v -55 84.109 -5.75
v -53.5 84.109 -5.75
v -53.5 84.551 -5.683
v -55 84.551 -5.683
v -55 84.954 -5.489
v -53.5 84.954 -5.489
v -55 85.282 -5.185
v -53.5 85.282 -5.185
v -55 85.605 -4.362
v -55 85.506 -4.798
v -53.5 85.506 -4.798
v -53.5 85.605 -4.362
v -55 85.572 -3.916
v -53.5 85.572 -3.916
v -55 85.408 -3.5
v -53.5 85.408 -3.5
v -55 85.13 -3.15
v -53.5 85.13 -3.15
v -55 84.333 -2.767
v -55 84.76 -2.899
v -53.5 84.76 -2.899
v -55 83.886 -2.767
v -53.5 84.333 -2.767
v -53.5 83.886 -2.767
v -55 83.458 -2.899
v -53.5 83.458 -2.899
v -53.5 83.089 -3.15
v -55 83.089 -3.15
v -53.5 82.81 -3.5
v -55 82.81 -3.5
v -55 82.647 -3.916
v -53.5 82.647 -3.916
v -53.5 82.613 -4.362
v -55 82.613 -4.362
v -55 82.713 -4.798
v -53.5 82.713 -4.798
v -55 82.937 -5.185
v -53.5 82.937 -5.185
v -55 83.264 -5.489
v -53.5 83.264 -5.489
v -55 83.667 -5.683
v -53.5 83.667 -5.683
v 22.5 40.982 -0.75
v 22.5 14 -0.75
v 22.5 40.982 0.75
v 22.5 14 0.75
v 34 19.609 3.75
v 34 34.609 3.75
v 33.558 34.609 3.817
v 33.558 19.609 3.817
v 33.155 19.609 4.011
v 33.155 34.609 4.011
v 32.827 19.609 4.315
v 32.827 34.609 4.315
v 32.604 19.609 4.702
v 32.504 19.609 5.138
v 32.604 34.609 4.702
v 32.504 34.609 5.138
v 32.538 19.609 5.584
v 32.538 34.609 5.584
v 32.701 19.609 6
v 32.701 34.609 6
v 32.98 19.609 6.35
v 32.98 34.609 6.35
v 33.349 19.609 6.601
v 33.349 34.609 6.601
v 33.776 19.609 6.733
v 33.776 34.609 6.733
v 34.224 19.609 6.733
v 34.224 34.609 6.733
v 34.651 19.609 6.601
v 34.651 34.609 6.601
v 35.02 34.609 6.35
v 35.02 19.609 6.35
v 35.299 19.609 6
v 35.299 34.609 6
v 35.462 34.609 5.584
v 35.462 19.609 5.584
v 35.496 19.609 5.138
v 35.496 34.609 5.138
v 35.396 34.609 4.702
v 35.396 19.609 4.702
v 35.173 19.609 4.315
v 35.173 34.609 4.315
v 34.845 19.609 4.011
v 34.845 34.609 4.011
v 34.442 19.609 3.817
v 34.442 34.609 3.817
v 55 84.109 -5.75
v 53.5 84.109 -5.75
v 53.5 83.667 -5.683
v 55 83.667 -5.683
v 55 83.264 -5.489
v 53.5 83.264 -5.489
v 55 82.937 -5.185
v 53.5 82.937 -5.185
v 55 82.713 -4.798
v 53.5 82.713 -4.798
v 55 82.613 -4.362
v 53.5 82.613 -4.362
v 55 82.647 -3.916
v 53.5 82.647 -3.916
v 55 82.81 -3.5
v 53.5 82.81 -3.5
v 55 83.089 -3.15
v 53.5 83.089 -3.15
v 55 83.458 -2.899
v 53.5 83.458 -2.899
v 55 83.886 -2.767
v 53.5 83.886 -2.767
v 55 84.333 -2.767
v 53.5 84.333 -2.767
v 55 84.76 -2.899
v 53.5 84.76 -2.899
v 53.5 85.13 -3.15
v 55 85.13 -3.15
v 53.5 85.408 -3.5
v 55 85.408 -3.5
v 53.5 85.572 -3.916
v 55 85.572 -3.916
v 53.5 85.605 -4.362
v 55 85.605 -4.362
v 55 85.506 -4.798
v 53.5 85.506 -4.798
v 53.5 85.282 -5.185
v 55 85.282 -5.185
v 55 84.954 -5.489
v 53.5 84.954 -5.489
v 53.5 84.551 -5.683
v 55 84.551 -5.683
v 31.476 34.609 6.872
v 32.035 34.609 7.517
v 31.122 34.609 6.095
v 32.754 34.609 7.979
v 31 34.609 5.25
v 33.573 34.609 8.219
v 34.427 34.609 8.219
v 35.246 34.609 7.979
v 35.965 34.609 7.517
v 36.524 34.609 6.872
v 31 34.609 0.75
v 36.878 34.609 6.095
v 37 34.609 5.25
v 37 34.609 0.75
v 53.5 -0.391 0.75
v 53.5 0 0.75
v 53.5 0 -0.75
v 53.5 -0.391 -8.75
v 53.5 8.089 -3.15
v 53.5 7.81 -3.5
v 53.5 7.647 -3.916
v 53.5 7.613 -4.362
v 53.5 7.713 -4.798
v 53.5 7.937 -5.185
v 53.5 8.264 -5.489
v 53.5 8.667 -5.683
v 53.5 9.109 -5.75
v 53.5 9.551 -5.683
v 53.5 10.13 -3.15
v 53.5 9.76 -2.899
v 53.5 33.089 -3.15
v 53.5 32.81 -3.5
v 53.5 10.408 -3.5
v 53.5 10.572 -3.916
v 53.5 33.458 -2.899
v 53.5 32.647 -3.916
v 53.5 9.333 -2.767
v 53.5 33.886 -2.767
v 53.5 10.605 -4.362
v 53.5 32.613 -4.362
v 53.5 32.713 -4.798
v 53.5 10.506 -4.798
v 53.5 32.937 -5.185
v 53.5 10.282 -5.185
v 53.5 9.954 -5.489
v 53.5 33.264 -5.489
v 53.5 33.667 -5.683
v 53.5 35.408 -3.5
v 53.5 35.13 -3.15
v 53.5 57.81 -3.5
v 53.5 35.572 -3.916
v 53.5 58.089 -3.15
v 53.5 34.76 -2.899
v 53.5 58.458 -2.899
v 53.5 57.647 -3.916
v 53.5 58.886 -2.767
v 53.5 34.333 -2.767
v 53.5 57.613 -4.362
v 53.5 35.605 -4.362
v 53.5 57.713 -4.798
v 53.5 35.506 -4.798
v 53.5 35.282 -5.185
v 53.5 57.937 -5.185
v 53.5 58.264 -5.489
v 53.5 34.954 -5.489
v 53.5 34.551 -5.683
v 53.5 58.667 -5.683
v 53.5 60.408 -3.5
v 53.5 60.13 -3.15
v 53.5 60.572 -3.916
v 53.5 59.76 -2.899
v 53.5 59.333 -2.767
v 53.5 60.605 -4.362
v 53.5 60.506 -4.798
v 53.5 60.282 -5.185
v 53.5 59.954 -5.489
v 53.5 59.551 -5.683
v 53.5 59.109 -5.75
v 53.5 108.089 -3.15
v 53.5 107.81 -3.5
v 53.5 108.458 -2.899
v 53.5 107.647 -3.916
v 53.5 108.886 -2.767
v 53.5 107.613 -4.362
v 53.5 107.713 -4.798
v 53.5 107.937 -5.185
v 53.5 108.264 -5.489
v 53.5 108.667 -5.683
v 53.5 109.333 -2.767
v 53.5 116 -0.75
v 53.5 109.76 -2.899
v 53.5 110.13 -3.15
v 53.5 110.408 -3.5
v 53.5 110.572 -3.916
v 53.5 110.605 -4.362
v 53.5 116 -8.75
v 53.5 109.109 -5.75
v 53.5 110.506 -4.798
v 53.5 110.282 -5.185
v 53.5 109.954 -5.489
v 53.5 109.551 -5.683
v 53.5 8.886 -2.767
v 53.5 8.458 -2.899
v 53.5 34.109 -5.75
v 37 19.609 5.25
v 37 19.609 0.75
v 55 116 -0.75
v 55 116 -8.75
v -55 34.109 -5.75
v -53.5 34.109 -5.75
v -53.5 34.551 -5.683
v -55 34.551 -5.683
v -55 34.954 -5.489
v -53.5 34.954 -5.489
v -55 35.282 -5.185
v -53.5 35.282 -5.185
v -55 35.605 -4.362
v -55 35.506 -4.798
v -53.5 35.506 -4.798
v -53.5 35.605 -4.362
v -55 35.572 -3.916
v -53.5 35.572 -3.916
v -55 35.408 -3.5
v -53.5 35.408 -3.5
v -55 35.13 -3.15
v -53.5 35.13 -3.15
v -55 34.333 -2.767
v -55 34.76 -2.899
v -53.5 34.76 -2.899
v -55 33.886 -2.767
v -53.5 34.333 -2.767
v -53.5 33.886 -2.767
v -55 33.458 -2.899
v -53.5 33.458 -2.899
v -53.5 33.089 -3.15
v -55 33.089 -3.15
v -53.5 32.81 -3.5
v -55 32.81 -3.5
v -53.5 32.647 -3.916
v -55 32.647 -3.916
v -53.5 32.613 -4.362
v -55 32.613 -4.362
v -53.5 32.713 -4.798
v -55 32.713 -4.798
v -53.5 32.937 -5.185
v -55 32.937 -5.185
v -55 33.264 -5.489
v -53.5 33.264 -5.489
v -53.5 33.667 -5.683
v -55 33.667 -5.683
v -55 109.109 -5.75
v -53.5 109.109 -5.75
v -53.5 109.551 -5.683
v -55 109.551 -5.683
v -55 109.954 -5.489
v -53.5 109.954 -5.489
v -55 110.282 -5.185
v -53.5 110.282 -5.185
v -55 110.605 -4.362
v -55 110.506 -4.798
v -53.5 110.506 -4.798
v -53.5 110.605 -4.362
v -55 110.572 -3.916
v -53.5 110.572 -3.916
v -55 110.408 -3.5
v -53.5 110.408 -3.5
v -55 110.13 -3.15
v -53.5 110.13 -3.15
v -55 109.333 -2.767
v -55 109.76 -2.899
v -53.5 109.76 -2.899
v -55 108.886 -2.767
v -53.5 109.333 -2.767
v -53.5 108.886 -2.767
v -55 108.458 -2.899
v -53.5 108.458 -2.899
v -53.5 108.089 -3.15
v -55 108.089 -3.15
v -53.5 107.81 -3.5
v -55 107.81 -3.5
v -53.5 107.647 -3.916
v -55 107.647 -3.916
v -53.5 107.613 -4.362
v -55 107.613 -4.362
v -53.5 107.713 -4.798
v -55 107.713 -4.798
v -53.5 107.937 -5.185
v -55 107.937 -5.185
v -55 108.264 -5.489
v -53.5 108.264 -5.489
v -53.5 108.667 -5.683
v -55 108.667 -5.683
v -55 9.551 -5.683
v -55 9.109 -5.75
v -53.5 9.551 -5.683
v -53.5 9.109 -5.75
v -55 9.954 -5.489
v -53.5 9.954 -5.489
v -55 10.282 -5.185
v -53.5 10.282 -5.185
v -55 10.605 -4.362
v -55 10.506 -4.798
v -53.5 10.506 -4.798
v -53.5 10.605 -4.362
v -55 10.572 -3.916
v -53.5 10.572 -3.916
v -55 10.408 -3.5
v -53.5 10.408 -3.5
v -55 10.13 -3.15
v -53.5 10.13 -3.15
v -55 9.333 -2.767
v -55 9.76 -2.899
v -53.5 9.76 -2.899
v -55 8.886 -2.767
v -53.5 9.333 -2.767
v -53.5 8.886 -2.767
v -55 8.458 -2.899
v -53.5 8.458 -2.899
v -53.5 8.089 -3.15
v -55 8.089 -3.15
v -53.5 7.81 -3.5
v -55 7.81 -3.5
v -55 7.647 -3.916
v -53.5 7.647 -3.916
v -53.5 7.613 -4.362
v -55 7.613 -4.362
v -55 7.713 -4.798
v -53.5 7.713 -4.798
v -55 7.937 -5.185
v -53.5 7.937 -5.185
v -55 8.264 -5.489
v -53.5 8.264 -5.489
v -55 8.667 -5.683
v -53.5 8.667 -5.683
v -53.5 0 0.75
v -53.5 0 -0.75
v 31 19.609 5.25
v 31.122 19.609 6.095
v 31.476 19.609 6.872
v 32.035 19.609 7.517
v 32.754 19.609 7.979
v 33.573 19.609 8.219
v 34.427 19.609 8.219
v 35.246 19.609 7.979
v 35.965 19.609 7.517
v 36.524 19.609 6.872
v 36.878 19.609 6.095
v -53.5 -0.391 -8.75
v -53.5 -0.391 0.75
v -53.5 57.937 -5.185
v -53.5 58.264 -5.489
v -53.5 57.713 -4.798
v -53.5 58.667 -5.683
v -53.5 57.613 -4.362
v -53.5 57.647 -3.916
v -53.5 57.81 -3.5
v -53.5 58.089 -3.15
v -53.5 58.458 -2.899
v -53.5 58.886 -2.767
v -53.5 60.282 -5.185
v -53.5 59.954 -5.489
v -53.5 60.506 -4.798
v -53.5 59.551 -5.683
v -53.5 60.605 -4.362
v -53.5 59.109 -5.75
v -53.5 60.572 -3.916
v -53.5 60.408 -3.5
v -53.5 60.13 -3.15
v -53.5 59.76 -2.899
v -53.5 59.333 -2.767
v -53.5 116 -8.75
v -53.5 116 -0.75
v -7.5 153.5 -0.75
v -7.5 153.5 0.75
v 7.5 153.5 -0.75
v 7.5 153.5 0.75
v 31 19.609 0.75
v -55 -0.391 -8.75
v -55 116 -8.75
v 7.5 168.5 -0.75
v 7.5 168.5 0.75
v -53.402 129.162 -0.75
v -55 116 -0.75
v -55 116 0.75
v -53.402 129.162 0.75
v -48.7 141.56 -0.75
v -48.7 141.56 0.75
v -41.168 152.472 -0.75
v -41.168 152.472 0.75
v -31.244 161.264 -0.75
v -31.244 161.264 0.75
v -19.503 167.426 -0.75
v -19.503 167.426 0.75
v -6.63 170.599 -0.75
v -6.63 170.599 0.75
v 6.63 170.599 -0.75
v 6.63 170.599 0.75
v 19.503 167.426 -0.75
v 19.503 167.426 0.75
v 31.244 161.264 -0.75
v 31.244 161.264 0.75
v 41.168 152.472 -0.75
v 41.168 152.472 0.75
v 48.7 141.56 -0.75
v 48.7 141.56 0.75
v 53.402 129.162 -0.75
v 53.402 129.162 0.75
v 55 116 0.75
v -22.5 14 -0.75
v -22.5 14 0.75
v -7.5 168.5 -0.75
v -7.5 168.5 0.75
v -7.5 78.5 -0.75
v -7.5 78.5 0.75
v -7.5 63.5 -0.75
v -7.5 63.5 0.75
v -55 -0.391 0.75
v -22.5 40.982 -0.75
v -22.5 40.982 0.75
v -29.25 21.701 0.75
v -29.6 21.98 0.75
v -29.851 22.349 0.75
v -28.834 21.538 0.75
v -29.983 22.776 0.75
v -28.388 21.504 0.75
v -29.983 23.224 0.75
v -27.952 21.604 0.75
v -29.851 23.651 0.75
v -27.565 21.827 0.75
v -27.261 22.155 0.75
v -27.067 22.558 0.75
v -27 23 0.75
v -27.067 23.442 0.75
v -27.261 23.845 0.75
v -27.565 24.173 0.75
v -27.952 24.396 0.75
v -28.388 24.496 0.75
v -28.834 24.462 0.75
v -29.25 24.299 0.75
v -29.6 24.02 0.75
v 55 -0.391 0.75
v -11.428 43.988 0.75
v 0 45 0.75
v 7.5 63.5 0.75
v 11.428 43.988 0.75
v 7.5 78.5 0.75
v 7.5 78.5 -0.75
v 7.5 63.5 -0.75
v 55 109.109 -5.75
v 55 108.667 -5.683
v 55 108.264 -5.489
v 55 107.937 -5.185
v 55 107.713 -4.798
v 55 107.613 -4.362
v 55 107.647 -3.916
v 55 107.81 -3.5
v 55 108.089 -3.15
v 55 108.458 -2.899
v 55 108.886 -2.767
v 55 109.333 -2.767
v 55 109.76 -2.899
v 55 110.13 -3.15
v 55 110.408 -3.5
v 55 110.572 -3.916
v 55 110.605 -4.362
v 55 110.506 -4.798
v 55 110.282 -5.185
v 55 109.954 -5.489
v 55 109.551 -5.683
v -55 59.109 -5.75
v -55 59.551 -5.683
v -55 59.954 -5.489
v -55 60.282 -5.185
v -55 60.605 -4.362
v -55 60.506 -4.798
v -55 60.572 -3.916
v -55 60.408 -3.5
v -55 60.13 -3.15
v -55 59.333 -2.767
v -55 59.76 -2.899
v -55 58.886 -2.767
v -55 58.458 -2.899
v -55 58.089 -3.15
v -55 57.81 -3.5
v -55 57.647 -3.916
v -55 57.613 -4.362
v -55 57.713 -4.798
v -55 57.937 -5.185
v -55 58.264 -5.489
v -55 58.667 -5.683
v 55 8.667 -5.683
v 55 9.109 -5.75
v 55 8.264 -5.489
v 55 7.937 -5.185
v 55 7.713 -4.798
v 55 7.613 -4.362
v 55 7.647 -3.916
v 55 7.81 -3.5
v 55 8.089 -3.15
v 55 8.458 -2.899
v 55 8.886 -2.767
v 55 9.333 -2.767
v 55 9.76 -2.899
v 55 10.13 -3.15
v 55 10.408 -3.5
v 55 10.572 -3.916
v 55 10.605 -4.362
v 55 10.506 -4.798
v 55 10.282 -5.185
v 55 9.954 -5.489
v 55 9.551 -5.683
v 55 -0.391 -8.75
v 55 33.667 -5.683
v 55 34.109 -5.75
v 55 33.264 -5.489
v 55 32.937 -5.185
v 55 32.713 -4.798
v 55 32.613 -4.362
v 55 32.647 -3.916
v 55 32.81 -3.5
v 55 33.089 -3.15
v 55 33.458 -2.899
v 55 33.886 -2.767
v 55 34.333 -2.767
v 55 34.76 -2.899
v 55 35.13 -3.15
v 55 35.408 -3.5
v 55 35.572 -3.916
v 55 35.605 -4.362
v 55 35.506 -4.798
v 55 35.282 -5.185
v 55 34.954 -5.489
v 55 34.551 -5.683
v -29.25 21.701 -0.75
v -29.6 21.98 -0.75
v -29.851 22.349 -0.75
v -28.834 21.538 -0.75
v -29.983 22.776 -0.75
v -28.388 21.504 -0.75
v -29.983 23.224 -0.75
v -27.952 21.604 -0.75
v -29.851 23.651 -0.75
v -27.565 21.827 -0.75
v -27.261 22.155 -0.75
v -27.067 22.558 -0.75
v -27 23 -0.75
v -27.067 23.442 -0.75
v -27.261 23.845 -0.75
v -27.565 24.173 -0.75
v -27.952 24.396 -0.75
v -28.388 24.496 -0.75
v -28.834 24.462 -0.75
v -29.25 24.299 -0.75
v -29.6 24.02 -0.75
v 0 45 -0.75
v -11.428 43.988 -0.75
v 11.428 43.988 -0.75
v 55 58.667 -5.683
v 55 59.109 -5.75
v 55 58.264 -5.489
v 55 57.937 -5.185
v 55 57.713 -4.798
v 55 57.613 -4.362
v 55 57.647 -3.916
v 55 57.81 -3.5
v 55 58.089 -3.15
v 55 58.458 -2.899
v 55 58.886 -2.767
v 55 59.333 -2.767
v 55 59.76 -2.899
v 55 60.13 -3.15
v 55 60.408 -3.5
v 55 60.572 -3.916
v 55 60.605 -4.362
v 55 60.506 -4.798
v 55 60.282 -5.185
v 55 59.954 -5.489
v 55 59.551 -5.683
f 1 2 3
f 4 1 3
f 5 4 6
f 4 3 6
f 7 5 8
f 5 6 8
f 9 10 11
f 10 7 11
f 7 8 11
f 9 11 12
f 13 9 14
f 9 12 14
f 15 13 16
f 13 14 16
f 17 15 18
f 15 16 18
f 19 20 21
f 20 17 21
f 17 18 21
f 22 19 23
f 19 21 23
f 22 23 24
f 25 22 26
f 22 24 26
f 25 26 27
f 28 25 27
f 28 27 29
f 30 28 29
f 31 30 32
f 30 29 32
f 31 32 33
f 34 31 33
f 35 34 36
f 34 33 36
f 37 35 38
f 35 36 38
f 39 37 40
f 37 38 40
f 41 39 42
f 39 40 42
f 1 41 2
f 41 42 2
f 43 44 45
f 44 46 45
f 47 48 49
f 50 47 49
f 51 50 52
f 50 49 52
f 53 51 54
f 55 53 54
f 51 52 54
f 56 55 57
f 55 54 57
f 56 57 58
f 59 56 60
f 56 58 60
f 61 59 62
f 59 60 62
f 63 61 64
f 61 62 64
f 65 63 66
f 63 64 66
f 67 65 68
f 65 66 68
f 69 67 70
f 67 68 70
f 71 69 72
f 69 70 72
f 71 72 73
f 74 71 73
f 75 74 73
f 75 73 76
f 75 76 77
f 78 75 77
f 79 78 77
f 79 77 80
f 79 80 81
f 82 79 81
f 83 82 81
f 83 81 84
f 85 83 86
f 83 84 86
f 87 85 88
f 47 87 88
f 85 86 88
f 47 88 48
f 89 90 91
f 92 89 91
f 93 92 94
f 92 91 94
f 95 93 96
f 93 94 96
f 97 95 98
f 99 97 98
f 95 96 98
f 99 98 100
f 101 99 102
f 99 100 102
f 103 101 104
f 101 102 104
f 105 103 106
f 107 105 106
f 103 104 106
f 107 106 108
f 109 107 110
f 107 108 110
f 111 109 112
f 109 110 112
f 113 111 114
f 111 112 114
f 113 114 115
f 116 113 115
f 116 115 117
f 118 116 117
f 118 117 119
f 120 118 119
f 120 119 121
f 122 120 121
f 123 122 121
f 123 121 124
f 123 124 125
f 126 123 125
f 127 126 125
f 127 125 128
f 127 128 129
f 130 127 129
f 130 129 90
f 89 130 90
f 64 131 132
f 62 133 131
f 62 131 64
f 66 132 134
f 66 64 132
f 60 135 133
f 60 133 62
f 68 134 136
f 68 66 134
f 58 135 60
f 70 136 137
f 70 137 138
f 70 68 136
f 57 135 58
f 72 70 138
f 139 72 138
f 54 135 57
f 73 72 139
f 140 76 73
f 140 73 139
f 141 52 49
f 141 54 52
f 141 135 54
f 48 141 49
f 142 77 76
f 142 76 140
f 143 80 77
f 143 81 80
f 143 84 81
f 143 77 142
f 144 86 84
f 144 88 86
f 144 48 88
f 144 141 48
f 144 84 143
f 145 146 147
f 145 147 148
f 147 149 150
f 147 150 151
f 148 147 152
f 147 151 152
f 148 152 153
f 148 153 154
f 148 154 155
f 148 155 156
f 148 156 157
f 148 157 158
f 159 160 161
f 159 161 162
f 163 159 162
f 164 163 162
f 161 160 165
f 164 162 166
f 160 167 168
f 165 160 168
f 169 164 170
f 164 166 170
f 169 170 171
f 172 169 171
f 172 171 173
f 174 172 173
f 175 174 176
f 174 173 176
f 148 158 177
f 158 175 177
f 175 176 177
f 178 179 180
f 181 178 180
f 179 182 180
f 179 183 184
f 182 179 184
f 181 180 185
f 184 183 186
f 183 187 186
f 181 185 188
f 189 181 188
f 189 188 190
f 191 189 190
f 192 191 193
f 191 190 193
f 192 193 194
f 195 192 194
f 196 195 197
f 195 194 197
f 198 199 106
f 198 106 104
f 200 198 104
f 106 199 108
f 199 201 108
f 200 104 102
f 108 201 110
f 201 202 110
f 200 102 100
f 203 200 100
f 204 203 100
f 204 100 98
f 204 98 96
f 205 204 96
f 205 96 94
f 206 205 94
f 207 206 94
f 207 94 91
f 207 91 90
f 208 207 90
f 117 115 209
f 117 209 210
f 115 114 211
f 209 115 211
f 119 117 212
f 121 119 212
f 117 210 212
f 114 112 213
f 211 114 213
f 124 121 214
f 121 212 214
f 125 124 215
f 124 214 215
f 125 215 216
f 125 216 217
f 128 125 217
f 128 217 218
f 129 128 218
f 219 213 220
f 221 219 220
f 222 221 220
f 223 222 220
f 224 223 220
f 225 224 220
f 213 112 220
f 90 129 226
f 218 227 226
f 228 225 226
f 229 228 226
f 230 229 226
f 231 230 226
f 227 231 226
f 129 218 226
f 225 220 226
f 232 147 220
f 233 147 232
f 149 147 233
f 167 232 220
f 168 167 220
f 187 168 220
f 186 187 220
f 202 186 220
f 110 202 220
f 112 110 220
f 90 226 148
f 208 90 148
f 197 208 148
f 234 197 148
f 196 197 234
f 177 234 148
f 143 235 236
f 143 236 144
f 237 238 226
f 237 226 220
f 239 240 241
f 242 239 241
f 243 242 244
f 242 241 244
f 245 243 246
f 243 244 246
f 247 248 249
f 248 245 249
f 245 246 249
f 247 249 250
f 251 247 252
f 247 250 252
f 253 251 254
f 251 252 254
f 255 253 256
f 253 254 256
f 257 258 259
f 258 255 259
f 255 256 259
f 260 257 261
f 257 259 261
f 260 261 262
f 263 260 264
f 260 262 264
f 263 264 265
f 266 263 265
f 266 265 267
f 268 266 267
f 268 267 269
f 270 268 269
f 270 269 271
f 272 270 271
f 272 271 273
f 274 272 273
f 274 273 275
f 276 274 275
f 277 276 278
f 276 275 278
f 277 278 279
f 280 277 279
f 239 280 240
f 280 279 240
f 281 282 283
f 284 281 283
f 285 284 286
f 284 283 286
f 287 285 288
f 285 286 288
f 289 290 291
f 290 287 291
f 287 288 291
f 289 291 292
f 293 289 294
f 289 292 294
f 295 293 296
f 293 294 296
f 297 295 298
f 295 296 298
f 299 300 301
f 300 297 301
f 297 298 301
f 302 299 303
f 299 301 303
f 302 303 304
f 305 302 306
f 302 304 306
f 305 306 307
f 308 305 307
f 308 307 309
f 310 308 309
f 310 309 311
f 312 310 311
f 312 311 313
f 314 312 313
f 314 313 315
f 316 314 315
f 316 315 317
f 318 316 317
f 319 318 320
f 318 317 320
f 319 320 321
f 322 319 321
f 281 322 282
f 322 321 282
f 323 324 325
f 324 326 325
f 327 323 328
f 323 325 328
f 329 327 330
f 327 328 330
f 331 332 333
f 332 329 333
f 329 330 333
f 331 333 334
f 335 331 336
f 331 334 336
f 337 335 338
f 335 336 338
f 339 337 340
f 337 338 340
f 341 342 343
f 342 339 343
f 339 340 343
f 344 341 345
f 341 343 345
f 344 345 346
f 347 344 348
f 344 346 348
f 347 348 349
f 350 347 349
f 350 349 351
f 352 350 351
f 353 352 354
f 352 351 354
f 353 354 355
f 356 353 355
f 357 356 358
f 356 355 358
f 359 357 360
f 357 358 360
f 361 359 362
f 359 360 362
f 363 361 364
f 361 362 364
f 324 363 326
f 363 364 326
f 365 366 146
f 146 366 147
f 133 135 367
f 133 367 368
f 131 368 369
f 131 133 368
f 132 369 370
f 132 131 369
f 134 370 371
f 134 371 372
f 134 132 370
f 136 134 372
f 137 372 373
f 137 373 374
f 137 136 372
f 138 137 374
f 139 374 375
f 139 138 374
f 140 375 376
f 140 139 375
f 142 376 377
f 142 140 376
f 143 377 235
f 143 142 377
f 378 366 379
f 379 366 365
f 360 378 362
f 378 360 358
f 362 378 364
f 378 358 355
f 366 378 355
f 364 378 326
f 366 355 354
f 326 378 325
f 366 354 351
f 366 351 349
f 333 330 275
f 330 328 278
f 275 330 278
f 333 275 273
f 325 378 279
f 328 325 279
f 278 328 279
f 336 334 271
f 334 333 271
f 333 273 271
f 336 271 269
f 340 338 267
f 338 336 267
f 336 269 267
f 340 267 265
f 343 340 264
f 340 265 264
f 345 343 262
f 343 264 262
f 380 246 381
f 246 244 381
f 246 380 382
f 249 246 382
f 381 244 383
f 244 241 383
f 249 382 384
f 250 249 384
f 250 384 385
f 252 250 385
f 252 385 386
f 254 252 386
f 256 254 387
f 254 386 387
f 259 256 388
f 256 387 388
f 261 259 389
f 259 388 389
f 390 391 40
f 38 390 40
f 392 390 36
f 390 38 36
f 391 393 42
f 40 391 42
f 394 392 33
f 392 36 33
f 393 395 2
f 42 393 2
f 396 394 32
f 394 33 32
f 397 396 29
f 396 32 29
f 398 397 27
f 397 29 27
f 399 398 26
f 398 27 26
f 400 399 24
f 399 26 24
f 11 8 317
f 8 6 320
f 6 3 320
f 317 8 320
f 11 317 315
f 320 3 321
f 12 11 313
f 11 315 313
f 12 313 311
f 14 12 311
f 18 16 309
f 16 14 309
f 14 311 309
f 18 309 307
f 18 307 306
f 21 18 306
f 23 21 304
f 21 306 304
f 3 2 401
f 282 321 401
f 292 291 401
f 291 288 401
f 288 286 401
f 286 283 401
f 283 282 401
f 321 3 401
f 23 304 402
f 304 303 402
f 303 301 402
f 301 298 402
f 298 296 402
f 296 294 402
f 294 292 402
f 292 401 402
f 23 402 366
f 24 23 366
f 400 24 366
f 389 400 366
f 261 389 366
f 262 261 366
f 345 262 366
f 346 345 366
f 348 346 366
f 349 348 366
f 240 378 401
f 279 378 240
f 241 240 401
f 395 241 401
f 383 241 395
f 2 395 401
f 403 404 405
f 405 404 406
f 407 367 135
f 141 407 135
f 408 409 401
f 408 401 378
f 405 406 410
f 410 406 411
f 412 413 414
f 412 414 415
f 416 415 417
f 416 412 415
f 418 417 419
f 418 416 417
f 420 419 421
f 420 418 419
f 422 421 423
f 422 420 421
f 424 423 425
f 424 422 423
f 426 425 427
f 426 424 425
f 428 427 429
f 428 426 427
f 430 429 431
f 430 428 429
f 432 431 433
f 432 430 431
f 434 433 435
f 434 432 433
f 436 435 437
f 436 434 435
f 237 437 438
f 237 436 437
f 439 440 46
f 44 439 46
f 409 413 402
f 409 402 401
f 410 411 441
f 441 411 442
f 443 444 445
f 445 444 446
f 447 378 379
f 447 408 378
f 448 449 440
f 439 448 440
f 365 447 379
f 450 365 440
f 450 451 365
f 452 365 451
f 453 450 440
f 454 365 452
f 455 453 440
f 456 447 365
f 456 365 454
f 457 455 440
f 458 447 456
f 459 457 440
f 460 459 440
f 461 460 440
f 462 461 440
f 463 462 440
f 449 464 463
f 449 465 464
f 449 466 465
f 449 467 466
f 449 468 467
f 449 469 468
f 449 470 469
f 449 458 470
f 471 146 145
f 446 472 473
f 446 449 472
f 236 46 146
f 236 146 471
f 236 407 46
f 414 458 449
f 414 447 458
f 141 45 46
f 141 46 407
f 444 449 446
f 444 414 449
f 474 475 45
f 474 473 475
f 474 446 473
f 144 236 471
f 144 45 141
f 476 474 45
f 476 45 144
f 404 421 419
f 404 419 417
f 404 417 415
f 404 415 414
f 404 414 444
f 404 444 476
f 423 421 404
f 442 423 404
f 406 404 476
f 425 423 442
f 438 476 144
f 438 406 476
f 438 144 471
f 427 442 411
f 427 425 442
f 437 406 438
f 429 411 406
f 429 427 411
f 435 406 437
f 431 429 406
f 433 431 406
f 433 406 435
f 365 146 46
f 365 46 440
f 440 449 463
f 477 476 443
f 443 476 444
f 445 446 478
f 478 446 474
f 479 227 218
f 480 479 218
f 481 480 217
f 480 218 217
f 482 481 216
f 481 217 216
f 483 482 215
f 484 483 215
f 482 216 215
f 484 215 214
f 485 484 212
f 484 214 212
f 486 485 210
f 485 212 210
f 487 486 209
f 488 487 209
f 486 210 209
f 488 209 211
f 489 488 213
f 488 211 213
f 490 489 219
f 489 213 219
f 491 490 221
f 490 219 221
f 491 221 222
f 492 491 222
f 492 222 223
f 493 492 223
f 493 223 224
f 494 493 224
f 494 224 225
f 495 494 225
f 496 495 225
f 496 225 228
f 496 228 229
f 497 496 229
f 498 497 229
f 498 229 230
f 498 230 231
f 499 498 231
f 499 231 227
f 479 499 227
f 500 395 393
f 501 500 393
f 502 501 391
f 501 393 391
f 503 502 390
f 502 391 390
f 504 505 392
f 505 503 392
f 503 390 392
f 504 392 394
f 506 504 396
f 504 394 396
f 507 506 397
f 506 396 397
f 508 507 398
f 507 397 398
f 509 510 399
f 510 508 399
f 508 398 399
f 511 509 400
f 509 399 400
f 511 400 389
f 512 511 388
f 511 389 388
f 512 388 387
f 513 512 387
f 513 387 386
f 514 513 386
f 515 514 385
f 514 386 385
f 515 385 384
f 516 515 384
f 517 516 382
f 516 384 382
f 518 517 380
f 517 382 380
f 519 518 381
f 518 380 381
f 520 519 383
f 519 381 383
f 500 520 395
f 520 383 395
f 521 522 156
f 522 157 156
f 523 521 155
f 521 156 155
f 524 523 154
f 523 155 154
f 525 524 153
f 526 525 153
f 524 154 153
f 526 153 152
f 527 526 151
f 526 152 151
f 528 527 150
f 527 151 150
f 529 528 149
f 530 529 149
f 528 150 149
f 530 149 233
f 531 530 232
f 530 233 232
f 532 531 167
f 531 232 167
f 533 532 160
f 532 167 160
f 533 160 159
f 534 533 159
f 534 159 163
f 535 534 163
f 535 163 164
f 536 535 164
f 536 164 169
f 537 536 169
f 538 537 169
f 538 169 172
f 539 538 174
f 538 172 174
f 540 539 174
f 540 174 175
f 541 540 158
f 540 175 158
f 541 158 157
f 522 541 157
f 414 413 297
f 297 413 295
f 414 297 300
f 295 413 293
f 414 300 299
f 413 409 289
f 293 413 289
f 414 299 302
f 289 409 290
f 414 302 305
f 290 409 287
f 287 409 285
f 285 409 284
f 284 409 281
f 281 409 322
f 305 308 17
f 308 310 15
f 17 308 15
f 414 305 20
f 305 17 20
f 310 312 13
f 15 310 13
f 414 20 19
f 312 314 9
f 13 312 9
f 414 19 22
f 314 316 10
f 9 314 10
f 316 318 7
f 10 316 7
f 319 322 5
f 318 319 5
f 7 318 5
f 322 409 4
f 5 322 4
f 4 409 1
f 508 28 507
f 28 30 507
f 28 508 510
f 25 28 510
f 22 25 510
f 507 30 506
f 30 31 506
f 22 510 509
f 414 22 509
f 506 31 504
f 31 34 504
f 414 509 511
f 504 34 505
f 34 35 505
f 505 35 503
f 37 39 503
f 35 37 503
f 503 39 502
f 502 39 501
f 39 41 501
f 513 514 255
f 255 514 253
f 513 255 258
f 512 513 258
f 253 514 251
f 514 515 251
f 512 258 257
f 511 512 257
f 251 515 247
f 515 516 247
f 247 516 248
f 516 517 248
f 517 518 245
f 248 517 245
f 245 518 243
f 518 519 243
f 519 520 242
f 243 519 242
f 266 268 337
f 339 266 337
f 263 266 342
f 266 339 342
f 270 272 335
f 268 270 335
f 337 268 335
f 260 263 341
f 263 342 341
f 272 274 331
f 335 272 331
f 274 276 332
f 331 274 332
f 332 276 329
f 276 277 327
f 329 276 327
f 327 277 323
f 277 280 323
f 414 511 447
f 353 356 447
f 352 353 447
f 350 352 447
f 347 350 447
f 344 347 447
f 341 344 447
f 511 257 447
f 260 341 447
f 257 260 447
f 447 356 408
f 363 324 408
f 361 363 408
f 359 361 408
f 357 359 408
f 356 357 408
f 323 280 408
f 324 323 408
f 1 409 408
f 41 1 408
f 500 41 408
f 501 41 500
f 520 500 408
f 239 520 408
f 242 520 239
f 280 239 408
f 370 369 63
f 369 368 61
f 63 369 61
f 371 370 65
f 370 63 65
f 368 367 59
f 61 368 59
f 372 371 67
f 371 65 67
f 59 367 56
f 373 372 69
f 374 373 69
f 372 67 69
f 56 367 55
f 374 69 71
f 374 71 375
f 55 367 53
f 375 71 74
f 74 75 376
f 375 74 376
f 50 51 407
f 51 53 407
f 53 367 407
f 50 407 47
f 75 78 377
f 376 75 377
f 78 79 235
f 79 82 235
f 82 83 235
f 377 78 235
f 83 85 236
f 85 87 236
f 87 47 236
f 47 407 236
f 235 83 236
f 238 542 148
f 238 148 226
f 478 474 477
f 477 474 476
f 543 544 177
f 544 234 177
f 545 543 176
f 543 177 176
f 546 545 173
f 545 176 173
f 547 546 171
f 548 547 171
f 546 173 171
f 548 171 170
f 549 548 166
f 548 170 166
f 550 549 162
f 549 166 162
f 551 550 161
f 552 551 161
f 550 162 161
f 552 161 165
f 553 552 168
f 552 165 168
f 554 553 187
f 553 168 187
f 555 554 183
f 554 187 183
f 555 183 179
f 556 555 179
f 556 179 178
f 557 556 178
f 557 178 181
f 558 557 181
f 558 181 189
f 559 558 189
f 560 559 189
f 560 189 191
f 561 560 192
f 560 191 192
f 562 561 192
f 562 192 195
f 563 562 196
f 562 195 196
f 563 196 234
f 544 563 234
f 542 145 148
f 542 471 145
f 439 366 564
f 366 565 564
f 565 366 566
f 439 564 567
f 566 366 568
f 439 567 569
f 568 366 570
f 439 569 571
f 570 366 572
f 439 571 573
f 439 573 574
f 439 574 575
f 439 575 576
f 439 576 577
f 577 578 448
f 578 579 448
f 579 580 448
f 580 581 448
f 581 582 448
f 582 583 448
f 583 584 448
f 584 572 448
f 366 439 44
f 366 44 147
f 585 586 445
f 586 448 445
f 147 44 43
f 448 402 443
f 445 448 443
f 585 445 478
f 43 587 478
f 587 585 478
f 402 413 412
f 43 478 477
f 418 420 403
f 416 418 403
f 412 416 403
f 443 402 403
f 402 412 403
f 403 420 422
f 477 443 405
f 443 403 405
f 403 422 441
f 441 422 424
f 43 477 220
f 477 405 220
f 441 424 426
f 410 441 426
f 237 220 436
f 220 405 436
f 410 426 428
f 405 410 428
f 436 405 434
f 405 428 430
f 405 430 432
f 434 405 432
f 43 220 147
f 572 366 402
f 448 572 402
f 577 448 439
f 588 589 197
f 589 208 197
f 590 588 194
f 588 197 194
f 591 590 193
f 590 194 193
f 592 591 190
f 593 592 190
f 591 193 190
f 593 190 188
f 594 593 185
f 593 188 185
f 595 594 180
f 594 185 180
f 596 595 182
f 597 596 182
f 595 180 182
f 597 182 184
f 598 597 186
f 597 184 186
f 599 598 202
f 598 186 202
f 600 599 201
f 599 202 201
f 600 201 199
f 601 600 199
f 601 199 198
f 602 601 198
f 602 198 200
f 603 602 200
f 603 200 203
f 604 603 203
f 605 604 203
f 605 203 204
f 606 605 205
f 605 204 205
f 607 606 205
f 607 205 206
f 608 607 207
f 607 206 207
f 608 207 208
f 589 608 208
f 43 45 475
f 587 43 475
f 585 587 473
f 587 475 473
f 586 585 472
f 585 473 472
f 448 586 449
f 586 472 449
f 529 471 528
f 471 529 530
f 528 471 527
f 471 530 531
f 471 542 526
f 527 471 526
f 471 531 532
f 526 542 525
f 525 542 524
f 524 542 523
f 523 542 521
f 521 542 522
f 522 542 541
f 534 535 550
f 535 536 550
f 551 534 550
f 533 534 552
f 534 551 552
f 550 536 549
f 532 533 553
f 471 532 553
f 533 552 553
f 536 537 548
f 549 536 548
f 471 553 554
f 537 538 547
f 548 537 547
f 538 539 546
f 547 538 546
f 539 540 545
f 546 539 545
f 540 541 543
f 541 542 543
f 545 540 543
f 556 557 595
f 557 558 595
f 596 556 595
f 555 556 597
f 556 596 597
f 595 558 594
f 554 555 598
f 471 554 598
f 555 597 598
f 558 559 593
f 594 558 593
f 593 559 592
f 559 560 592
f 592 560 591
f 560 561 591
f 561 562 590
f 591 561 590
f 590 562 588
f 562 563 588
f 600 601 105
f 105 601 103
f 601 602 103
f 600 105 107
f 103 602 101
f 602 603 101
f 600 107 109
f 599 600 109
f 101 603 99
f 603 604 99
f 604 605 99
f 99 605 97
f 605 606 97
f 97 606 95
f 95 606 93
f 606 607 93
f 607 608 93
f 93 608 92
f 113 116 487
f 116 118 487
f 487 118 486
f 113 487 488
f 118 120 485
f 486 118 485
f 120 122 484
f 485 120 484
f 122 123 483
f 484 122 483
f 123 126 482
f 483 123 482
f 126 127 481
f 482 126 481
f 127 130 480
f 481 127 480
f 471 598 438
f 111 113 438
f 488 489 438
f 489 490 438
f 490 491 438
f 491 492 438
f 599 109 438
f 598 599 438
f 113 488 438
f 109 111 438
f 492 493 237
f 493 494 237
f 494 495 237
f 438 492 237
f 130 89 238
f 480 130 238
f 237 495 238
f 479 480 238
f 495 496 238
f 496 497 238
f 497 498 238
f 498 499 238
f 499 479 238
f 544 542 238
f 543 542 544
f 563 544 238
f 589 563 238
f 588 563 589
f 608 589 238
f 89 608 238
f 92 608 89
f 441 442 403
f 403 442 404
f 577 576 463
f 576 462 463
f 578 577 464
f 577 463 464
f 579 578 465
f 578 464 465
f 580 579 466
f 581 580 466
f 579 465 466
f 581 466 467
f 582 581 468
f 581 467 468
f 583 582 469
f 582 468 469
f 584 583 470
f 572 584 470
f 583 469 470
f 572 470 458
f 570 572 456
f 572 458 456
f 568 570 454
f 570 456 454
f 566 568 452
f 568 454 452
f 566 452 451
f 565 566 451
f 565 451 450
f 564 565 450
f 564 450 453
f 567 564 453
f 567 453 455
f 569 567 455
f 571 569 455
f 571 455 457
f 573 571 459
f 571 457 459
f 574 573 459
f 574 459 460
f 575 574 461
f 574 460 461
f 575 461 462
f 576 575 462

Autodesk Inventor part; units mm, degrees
ref_plane "XZ Plane" through (0, 0, 0) normal (0, 1, 0) x (-1, 0, 0)
ref_plane "XY Plane" through (0, 0, 0) normal (0, 0, 1) x (1, 0, 0)
sketch "Sketch2" plane through (0, 0, 0) normal (0, 0, 1) x (1, 0, 0)
  line L0 (-55, 0) -> (55, 0)
  line L1 (55, 0) -> (55, 116)
  arc A0 (55, 116) -> (-55, 116) centre (0, 116) ccw
  line L2 (-55, 116) -> (-55, 0)
  point P0 (0, 0)
  point P1 (0, 0)
  dimension "d0" = 55
  dimension "d1" = 116
extrude "Extrusion1" add sketch "Sketch2" along normal mid plane 1.5
sketch "Sketch3" plane through (0, 0, 0.75) normal (0, 0, 1) x (1, 0, 0)
  line L0 (-22.5, 14) -> (22.5, 14)
  line L1 (22.5, 14) -> (22.5, 40.9816)
  line L2 (-22.5, 40.9816) -> (-22.5, 14)
  arc A0 (22.5, 40.9816) -> (-22.5, 40.9816) centre (0, -20) ccw
  arc A1 (55, 116) -> (-55, 116) centre (0, 116) ccw projected
  line L3 (-55, 0) -> (55, 0) projected
  point P0 (0, 0)
  point P1 (0, 14)
  point P2 (0, 171)
  point P3 (0, 45)
  dimension "d4" = 65
  dimension "d5" = 45
  dimension "d6" = 14
  dimension "d7" = 31
extrude "Extrusion2" cut sketch "Sketch3" against normal up to surface (1.5 mm away)
sketch "Sketch4" plane through (0, 0, 0.75) normal (0, 0, 1) x (1, 0, 0)
  line L0 (-7.5, 63.5) -> (7.5, 63.5)
  line L1 (7.5, 63.5) -> (7.5, 78.5)
  line L2 (7.5, 78.5) -> (-7.5, 78.5)
  line L3 (-7.5, 78.5) -> (-7.5, 63.5)
  line L4 (-7.5, 153.5) -> (7.5, 153.5)
  line L5 (7.5, 153.5) -> (7.5, 168.5)
  line L6 (7.5, 168.5) -> (-7.5, 168.5)
  line L7 (-7.5, 168.5) -> (-7.5, 153.5)
  arc A0 (22.5, 40.9816) -> (-22.5, 40.9816) centre (0, -20) ccw projected
  arc A1 (55, 116) -> (-55, 116) centre (0, 116) ccw projected
  point P0 (0, 0)
  point P1 (0, 153.5)
  point P2 (0, 45)
  point P3 (0, 63.5)
  point P4 (0, 45)
  point P5 (7.5, 71)
  dimension "d10" = 15
  dimension "d11" = 15
  dimension "d12" = 15
  dimension "d13" = 15
  dimension "d14" = 37.5
  dimension "d15" = 37.5
extrude "Extrusion3" cut sketch "Sketch4" against normal up to surface (1.5 mm away)
sketch "Sketch6" plane through (55, 0, 0.75) normal (1, 0, 0) x (0, 0, -1)
  line L0 (0, 0) -> (0, 116) projected
  line L1 (1.5, 116) -> (0, 116) projected
  line L2 (1.5, 116) -> (1.5, 0) projected
  line L3 (0, 0) -> (1.5, 0) projected
  line L4 (0, -0.3907) -> (9.5, -0.3907)
  line L5 (9.5, -0.3907) -> (9.5, 116)
  line L6 (9.5, 116) -> (0, 116)
  line L7 (0, 116) -> (0, -0.3907)
  point P0 (0.75, 0)
  dimension "d18" = 9.5
extrude "Extrusion4" add sketch "Sketch6" against normal blind 1.5
sketch "Sketch7" plane through (55, -0.3907, 0.75) normal (1, 0, 0) x (0, 0, -1)
  line L0 (0, 0) -> (9.5, 0) projected
  line L1 (0, 116.3907) -> (0, 0) projected
  point P0 (0.75, 0.3907)
  point P1 (5, 109.5)
  point P2 (5, 84.5)
  point P3 (5, 59.5)
  point P4 (5, 34.5)
  point P5 (5, 9.5)
  dimension "d21" = 9.5
  dimension "d22" = 25
  dimension "d23" = 25
  dimension "d24" = 25
  dimension "d25" = 25
  dimension "d26" = 5
hole "Hole1" at (55, 109.1093, -4.25) at (55, 84.1093, -4.25) at (55, 59.1093, -4.25) at (55, 34.1093, -4.25) at (55, 9.1093, -4.25) direction (-1, 0, 0) diameter 3 depth 1.5
mirror "Mirror1" about plane through (0, 0, 0) normal (1, 0, 0) of "Extrusion4", "Hole1"
ref_plane "Work Plane1" through (31, 0, 0) normal (1, 0, 0) x (0, 1, 0)
sketch "Sketch8" plane through (31, 0, 0) normal (1, 0, 0) x (0, 1, 0)
  point P0 (0, 0)
sketch "Sketch9" plane through (31, 0, 0) normal (1, 0, 0) x (0, 1, 0)
  line L0 (40.9816, 0.75) -> (14, 0.75) projected
  line L1 (14, 0.75) -> (40.9816, 0.75) projected
  line L2 (34.6093, 0.75) -> (34.6093, 5.25)
  line L3 (34.6093, 5.25) -> (19.6093, 5.25)
  line L4 (19.6093, 5.25) -> (19.6093, 0.75)
  line L5 (-0.3907, -8.75) -> (-0.3907, 0.75) projected
  point P0 (0, 0)
  dimension "d35" = 20
  dimension "d36" = 15
  dimension "d37" = 4.5
extrude "Extrusion5" add sketch "Sketch9" along normal blind 6
sketch "Sketch10" plane through (31, 34.6093, 5.25) normal (0, 1, 0) x (1, 0, 0)
  line L0 (0, 4.5) -> (0, 0) projected
  line L1 (0, 0) -> (6, 0) projected
  line L2 (6, 4.5) -> (6, 0) projected
  line L3 (0, 4.5) -> (6, 4.5) projected
  arc A0 (0, 0) -> (6, 0) centre (3, 0) ccw
  point P0 (-31, 5.25)
extrude "Extrusion6" add sketch "Sketch10" against normal up to surface (15 mm away) contours L1 A0
sketch "Sketch11" plane through (31, 19.6093, 0.75) normal (0, -1, 0) x (1, 0, 0)
  arc A0 (6, 4.5) -> (0, 4.5) centre (3, 4.5) ccw projected
  point P0 (-31, -0.75)
  point P1 (3, 7.5)
hole "Hole2" at (34, 19.6093, 5.25) direction (0, 1, 0) diameter 3 depth 15
sketch "Sketch12" plane through (0, 0, 0.75) normal (0, 0, 1) x (1, 0, 0)
  circle A0 centre (-28.5, 23) radius 1.5
  line L0 (-22.5, 14) -> (-22.5, 40.9816) projected
  line L1 (-53.5, 0) -> (53.5, 0) projected
  point P0 (0, 0)
  dimension "d49" = 3
  dimension "d50" = 6
  dimension "d51" = 23
extrude "Extrusion7" cut sketch "Sketch12" against normal up to surface (1.5 mm away)
equation "\"d13\" = d12"
equation "\"d15\" = d14"
equation "\"d23\" = d22"
equation "\"d24\" = d22"
equation "\"d25\" = d22"
properties part number "1 part 07"
